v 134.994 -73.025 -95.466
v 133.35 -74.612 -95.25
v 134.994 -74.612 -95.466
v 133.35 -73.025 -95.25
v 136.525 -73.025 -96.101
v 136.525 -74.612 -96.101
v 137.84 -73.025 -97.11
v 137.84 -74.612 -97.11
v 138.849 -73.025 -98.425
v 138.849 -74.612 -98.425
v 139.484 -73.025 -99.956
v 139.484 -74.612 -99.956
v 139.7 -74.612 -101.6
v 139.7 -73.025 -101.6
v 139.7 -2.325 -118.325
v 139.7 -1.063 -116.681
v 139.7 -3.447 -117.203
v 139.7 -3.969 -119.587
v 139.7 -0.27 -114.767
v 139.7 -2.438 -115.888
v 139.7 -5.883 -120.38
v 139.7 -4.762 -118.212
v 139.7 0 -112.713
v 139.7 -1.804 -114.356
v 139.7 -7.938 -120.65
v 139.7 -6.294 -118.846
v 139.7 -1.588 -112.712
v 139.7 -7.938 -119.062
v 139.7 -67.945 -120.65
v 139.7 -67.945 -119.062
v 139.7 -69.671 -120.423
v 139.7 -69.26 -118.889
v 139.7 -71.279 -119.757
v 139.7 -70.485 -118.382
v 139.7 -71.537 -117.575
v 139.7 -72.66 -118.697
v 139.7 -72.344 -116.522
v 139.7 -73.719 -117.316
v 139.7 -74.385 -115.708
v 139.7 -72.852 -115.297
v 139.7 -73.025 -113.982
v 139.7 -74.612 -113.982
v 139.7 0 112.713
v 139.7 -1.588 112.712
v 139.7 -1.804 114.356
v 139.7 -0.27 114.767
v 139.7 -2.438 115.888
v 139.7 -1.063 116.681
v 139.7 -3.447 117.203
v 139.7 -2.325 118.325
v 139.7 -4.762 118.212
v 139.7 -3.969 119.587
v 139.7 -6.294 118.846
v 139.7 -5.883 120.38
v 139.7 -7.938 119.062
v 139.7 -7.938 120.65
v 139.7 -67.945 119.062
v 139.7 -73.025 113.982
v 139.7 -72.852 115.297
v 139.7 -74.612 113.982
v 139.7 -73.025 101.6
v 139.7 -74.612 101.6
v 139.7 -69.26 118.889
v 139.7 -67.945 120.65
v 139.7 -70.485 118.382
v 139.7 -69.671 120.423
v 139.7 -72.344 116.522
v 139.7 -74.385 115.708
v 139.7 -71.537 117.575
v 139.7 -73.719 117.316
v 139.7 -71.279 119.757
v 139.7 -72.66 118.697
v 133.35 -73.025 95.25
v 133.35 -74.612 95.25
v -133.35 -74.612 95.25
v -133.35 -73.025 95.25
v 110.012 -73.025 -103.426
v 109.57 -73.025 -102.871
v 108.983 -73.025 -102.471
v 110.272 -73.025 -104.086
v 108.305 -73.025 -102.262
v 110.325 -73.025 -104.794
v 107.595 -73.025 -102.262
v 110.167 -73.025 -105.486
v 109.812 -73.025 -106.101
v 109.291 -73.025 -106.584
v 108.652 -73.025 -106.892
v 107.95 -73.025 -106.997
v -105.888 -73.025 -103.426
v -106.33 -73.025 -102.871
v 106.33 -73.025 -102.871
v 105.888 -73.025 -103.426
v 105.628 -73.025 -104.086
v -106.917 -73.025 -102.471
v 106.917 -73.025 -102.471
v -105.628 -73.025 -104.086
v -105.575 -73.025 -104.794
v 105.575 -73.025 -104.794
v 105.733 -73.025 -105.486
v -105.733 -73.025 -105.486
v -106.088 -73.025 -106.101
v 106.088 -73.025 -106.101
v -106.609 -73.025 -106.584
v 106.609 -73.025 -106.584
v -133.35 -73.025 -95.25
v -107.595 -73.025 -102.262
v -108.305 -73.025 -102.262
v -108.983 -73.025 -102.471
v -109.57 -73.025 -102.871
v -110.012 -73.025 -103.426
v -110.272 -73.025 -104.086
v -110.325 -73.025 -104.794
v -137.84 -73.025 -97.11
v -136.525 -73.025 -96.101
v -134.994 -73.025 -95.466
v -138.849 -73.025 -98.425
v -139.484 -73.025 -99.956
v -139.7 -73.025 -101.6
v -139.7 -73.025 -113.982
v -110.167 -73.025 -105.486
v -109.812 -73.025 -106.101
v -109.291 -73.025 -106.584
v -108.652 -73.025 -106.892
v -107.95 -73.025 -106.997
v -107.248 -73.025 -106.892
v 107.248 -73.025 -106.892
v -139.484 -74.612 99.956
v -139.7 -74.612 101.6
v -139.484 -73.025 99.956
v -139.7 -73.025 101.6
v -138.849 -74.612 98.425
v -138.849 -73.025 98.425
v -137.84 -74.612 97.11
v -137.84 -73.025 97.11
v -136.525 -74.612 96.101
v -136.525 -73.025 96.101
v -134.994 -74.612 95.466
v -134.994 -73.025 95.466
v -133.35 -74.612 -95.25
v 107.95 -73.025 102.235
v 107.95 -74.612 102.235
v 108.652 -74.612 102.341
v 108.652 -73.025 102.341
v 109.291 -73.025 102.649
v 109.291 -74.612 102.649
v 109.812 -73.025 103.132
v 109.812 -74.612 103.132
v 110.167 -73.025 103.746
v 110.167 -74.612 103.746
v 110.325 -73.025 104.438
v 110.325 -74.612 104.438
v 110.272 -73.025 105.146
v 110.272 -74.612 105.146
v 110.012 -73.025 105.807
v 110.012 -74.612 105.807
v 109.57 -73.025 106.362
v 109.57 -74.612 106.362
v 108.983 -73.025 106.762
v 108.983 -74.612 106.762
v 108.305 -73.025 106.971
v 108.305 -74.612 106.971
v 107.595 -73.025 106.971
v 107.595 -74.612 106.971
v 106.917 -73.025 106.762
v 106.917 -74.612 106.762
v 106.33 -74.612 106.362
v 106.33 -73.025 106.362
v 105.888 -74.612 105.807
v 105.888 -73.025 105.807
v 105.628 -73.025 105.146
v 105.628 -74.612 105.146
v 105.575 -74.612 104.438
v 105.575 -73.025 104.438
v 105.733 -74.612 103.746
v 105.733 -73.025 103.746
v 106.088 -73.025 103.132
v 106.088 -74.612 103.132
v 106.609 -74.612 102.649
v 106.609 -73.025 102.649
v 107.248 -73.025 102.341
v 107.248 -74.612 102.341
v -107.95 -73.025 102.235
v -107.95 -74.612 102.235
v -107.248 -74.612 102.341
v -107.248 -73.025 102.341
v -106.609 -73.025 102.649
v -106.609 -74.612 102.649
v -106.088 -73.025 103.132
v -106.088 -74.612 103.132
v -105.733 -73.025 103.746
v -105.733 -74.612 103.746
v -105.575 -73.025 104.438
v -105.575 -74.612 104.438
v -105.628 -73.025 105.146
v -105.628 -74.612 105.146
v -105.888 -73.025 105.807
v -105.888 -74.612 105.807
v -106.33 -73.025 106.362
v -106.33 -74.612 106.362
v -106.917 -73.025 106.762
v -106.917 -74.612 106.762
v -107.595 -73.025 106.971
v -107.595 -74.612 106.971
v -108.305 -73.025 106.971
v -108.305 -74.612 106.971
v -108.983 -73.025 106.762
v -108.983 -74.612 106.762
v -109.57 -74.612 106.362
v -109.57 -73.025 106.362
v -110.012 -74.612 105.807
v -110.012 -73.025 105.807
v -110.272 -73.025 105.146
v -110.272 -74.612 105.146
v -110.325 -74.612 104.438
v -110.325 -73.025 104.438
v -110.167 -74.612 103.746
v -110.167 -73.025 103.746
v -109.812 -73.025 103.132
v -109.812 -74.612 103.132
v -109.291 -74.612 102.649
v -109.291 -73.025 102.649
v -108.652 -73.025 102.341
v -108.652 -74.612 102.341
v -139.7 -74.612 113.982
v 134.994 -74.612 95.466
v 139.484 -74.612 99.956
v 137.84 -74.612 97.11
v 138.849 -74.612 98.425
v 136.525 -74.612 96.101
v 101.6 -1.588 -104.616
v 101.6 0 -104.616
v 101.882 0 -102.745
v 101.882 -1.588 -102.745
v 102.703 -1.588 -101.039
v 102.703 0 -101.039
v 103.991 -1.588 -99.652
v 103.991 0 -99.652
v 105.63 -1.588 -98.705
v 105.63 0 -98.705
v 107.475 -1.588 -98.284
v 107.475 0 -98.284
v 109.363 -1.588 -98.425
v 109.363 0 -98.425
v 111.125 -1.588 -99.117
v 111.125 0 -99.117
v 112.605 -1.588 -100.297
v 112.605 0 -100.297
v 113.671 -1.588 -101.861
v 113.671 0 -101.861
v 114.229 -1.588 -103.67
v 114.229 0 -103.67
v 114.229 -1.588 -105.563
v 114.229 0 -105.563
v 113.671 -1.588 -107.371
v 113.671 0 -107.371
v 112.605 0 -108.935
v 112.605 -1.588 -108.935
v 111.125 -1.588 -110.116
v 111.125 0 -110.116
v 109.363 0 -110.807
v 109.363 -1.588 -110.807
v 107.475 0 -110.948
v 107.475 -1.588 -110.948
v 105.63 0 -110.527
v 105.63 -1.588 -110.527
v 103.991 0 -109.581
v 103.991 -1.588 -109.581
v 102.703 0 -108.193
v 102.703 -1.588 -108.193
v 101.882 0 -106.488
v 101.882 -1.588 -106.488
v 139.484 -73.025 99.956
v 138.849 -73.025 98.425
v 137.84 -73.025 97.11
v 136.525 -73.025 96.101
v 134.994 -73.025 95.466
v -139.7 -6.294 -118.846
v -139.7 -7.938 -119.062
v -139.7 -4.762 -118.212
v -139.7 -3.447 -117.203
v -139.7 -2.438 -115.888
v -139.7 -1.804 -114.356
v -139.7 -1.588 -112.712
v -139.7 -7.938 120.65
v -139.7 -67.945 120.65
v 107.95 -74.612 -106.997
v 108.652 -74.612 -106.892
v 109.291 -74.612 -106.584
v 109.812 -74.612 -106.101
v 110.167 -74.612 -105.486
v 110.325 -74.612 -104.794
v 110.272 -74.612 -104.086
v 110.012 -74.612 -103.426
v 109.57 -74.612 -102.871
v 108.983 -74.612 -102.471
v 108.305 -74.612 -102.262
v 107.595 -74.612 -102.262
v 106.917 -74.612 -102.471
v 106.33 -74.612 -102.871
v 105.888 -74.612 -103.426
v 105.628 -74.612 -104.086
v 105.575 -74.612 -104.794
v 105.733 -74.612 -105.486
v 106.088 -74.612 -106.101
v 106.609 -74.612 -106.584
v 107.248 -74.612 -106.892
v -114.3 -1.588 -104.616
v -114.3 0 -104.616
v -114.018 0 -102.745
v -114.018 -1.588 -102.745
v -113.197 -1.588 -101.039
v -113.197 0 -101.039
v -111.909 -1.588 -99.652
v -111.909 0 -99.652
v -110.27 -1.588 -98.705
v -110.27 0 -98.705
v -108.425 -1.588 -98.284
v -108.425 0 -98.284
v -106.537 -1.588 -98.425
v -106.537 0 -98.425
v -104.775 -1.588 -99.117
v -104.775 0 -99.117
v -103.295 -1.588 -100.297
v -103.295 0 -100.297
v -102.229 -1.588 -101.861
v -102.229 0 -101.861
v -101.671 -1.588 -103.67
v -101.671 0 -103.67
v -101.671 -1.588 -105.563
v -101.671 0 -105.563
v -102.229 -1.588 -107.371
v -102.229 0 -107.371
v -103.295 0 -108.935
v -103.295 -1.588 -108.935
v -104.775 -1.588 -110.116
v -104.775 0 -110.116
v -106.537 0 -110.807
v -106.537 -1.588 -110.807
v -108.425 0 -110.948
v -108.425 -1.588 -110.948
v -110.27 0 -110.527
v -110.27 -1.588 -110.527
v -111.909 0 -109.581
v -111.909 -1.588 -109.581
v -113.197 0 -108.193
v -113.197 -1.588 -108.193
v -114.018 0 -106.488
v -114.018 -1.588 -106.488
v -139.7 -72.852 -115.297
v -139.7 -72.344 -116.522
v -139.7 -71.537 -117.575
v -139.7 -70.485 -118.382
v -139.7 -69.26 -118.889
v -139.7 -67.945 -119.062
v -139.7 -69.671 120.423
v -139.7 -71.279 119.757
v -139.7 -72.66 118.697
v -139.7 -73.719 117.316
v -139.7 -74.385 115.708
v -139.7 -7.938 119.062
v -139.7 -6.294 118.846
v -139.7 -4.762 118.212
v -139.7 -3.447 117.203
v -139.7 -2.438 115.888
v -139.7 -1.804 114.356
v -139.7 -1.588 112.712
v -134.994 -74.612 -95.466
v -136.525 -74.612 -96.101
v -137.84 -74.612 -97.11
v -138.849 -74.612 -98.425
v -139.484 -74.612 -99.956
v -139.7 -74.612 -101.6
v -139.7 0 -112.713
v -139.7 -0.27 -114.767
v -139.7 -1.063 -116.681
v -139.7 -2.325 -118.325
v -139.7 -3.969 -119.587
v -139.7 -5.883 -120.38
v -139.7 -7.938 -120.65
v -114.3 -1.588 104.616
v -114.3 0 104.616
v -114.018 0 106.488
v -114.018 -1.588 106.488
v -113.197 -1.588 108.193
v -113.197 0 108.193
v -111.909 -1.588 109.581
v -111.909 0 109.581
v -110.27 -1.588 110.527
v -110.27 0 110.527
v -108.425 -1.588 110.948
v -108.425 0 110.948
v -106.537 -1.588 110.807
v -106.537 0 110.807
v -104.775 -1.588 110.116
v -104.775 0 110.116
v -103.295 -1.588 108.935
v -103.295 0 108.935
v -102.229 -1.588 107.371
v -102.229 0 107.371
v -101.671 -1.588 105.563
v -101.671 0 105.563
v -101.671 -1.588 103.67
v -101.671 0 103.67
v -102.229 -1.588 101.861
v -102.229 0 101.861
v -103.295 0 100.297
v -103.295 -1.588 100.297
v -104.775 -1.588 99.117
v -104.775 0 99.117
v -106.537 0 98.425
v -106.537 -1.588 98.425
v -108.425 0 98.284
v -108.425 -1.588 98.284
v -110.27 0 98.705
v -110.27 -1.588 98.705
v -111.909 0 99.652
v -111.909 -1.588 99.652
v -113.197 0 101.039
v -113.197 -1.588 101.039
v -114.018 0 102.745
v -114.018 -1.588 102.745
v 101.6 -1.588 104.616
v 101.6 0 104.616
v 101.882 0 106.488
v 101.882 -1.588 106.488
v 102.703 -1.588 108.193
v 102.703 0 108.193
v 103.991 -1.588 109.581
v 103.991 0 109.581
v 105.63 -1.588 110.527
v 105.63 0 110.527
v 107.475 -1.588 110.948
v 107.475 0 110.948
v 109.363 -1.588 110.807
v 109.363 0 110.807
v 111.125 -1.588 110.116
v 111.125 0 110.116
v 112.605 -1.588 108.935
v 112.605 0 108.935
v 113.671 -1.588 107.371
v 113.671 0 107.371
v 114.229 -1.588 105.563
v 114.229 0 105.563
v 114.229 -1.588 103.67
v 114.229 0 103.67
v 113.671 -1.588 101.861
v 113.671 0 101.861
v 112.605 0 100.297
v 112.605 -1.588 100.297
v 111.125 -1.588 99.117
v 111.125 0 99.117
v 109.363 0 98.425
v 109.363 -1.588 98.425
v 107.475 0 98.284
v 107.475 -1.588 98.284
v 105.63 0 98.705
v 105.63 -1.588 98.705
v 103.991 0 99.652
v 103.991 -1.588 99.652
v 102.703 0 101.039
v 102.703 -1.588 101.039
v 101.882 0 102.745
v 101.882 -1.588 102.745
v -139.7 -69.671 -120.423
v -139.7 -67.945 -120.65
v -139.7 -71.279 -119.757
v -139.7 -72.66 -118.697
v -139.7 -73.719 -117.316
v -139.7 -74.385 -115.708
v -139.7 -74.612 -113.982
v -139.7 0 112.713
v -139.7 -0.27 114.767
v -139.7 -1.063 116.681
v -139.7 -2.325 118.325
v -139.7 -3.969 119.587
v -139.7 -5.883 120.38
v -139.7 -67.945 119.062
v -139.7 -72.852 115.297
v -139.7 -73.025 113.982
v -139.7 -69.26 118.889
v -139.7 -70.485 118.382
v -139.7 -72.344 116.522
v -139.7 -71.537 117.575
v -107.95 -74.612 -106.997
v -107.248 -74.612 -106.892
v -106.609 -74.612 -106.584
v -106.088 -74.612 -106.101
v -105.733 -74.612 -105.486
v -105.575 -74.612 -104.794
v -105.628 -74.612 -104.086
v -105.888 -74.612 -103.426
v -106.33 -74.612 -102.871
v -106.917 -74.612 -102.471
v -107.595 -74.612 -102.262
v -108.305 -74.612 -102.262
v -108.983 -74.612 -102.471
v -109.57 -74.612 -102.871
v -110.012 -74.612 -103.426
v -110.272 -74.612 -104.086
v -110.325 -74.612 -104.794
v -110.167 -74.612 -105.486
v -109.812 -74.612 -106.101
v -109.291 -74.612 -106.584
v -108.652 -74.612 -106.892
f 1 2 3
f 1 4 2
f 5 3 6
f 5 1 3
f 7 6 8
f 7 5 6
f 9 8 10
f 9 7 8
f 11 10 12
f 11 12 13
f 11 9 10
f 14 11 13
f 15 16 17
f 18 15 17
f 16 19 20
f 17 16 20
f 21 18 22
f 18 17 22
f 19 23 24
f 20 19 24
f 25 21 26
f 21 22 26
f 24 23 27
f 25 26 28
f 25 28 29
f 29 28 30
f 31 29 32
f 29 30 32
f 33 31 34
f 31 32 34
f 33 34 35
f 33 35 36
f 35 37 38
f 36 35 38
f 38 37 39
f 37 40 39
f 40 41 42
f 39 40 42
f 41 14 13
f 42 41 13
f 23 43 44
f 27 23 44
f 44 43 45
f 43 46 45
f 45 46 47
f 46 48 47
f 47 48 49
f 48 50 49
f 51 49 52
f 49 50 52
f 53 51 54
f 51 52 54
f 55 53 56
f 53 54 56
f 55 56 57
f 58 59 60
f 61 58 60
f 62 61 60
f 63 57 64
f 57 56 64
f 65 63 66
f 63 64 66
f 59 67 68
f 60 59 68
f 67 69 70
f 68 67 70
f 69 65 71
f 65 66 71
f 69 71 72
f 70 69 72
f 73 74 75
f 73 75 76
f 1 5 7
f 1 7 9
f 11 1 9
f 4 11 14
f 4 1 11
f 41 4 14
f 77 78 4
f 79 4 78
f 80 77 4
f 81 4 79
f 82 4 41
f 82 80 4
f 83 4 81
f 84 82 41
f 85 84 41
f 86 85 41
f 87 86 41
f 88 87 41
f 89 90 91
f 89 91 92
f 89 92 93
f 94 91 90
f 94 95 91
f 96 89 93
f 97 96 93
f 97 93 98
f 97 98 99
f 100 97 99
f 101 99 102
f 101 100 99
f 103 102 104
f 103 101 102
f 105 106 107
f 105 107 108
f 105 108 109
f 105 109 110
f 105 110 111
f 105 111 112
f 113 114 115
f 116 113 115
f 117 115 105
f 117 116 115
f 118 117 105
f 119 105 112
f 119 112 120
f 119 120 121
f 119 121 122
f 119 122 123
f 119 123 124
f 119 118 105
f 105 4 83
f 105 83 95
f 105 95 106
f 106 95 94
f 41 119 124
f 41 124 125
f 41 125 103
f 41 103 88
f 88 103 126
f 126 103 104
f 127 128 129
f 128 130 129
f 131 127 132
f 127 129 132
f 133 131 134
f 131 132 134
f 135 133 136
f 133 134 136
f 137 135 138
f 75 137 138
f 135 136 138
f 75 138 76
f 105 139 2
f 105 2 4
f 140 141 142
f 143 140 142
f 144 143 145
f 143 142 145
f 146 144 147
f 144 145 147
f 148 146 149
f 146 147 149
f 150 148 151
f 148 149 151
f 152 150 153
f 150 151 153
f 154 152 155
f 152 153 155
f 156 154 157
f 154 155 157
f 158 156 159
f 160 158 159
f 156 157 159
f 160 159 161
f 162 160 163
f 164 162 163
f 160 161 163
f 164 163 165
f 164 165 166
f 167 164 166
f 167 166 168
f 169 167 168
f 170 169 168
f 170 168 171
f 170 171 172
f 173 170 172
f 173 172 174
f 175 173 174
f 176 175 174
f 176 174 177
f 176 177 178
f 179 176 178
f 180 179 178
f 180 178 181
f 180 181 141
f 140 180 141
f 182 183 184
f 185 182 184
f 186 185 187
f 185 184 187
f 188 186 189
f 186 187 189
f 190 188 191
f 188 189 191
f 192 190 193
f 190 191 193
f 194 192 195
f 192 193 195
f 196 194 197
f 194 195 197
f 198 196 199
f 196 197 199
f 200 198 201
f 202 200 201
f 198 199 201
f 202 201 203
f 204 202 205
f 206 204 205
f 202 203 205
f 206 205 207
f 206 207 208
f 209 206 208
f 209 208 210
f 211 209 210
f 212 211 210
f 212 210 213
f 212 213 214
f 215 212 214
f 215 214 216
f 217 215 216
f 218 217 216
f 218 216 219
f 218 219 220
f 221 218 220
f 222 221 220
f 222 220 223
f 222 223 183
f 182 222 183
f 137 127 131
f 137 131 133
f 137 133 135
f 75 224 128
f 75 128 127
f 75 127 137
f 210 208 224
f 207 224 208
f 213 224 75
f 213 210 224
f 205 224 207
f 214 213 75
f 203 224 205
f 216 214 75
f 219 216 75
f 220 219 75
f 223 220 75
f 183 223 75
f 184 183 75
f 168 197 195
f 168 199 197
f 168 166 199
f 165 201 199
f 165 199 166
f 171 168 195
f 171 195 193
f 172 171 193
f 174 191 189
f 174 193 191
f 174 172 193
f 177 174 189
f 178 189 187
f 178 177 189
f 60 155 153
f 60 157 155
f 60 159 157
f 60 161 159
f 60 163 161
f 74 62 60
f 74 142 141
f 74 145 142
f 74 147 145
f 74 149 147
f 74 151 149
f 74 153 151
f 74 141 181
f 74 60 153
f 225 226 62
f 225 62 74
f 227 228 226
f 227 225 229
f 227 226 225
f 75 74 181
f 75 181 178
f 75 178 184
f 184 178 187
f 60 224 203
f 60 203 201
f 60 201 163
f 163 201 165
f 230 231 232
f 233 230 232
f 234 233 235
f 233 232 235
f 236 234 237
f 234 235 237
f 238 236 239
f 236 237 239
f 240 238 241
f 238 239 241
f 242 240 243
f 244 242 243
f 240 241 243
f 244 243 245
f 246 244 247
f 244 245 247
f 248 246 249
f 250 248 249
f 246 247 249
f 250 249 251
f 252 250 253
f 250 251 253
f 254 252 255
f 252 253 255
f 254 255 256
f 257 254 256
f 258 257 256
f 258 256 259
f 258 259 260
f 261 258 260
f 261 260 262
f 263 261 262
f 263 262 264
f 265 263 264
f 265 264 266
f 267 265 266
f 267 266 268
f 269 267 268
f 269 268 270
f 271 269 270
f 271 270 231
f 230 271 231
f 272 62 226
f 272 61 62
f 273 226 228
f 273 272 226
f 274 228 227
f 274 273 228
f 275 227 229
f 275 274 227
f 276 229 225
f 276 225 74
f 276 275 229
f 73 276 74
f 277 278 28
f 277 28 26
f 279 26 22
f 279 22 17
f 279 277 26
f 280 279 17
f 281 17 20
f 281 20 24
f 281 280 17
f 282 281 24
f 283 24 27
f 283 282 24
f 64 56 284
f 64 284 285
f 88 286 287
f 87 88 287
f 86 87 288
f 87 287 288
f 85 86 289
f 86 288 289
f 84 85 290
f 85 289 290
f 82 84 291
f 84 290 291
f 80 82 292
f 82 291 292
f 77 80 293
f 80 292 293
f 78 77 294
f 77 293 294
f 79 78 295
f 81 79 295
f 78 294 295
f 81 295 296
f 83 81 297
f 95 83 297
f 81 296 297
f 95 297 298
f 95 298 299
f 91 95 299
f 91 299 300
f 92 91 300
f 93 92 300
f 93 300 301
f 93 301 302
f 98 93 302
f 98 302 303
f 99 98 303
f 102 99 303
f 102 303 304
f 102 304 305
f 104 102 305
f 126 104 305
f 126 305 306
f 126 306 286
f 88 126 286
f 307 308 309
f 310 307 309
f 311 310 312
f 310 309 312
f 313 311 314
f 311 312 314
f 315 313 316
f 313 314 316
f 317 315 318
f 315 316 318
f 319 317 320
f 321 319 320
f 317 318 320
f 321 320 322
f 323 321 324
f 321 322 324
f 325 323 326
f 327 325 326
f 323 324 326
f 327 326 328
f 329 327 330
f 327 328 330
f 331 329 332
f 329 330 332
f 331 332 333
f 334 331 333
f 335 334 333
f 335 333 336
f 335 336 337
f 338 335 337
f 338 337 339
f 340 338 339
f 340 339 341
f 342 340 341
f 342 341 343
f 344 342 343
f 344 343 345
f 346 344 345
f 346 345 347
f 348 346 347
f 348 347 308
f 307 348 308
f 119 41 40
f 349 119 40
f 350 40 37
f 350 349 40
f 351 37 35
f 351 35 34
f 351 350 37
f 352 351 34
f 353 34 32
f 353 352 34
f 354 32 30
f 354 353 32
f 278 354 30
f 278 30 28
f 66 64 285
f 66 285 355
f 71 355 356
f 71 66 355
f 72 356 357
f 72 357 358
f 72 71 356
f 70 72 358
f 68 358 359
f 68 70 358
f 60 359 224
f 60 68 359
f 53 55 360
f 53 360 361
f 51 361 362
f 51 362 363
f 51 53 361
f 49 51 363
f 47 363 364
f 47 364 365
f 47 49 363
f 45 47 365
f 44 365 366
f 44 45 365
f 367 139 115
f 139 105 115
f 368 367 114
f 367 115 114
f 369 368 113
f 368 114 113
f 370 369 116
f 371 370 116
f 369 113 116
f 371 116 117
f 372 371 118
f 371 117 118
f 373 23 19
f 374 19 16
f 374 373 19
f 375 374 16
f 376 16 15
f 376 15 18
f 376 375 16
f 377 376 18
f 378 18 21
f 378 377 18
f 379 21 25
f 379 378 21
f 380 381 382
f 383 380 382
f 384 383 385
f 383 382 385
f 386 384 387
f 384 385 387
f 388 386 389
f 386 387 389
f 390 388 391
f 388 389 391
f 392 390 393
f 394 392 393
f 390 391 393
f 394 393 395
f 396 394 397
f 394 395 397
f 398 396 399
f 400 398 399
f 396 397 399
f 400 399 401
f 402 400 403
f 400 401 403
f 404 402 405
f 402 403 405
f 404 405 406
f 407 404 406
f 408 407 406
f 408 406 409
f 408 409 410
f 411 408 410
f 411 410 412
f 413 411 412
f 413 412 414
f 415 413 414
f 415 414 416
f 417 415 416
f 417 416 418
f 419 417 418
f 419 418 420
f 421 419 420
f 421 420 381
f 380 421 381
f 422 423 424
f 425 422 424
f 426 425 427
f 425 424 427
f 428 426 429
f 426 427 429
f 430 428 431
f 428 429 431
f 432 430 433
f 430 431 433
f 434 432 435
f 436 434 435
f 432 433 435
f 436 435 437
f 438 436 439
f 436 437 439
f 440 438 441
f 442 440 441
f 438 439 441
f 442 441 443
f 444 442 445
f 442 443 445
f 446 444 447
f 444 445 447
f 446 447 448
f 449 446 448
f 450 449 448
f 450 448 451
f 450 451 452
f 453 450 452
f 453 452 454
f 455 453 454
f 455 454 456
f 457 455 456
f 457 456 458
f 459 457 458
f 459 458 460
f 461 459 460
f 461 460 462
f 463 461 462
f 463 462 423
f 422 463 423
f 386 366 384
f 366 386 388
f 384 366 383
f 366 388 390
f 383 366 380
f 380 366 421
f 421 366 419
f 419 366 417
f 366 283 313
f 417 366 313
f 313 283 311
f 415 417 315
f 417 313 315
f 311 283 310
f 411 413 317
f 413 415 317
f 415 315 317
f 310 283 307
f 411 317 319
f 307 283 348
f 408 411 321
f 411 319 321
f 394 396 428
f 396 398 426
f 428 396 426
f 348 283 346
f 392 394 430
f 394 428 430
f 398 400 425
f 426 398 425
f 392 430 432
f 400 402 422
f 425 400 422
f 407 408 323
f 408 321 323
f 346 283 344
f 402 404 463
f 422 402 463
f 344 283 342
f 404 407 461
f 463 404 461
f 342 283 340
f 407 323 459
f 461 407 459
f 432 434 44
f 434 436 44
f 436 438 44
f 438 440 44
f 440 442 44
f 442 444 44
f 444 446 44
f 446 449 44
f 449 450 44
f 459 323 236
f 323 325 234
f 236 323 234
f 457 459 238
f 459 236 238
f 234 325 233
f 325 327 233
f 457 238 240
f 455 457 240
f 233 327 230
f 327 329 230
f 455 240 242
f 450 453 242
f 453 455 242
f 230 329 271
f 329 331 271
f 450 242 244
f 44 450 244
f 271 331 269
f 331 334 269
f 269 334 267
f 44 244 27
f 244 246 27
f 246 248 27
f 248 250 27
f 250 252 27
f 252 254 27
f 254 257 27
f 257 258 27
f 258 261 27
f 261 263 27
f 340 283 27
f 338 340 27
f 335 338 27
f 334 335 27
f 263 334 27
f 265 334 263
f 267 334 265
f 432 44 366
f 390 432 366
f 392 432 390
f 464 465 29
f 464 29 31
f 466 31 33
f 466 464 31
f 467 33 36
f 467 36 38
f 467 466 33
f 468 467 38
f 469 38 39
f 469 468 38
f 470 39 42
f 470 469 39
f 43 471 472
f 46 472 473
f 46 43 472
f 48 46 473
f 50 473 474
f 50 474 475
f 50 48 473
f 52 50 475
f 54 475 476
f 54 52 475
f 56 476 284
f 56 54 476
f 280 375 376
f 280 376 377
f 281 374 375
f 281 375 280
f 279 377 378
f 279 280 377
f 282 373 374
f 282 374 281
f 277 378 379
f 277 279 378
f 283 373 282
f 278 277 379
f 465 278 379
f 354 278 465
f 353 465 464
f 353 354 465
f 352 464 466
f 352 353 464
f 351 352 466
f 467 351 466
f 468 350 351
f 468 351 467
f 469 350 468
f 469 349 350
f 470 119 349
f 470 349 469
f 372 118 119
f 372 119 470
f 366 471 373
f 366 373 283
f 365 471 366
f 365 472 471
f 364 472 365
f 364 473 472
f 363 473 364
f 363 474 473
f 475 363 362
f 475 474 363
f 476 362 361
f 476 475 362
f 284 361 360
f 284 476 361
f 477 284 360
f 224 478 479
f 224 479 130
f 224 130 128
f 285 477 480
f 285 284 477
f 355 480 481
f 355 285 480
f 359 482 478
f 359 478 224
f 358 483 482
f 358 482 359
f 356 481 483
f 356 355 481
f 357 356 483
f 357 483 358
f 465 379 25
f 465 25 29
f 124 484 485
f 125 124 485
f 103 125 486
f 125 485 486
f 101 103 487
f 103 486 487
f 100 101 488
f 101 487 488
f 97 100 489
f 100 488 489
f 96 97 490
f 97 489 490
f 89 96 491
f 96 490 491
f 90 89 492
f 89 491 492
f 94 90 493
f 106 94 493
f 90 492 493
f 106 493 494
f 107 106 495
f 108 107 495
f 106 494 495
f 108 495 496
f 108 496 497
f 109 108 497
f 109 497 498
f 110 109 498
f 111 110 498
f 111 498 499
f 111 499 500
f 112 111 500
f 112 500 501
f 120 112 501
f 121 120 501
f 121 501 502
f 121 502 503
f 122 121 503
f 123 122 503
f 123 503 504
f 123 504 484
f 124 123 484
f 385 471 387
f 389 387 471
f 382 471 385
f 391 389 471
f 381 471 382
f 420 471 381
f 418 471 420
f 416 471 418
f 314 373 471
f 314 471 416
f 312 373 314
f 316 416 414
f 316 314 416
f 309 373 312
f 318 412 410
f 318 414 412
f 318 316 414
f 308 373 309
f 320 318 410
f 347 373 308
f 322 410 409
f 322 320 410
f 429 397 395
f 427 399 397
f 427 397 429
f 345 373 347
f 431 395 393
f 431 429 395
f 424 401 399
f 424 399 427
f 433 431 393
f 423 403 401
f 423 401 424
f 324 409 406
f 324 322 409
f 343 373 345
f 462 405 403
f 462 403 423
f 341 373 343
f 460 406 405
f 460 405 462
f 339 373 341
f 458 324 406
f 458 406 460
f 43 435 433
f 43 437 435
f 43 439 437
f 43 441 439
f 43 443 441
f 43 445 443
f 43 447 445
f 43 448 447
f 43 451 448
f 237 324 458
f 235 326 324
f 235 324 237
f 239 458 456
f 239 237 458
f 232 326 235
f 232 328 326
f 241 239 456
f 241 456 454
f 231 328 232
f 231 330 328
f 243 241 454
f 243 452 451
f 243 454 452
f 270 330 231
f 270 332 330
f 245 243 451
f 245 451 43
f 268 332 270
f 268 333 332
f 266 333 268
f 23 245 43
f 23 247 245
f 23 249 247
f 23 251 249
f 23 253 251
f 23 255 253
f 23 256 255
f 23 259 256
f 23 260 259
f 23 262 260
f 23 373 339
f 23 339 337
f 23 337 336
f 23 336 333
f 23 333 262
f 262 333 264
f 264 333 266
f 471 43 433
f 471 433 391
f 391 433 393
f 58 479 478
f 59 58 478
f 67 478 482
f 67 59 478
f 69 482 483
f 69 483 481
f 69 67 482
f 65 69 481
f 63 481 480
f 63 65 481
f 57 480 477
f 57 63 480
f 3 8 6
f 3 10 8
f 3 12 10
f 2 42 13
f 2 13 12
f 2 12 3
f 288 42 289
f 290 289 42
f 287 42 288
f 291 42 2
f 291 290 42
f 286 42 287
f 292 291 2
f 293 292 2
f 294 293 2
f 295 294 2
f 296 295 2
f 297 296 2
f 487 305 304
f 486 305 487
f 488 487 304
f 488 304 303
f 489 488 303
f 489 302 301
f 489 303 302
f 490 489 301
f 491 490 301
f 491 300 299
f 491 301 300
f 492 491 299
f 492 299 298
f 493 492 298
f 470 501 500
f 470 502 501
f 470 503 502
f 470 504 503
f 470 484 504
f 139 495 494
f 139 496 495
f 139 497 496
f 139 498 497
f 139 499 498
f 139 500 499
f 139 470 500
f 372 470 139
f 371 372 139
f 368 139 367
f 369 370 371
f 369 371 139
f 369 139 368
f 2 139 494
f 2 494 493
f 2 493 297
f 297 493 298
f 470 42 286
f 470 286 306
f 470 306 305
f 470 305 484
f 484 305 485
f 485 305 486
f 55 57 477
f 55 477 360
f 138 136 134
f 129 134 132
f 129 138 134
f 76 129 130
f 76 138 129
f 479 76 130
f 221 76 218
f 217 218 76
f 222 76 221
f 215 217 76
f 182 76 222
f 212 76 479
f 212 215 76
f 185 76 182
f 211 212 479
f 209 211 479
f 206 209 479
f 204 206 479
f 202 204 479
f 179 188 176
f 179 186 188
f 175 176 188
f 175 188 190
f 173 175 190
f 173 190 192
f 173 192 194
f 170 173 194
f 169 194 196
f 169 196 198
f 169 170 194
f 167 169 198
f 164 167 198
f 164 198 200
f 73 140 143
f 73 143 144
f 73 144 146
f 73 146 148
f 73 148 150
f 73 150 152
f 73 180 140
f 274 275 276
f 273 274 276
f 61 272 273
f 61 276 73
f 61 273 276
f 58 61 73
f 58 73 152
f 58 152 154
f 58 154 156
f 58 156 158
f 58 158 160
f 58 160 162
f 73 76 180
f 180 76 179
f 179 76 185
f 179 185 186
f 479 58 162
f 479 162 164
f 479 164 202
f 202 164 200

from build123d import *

# Parameters (mm, degrees)
BASE_FLANGE1_DEPTH             = 120.65
BASE_FLANGE1_DEPTH_BACK        = 120.65
SKETCH2_W                      = 279.4
SKETCH2_H                      = 1.5875
EDGE_FLANGE1_STRIP_W           = 19.05
EDGE_FLANGE1_STRIP_H           = 1.5875
EDGE_FLANGE1_STRIP_CUT_DEPTH   = 279.4
EDGE_FLANGE1_STRIP_2_W         = 19.05
EDGE_FLANGE1_STRIP_2_H         = 1.5875
EDGE_FLANGE1_STRIP_CUT_2_DEPTH = 279.4
EDGE_FLANGE1_DEPTH             = 279.4
EDGE_FLANGE1_BEND_DEPTH        = 279.4
EDGE_FLANGE2_STRIP_W           = 16.51
EDGE_FLANGE2_STRIP_H           = 1.5875
EDGE_FLANGE2_STRIP_CUT_DEPTH   = 279.4
EDGE_FLANGE2_STRIP_2_W         = 16.51
EDGE_FLANGE2_STRIP_2_H         = 1.5875
EDGE_FLANGE2_STRIP_CUT_2_DEPTH = 279.4
EDGE_FLANGE2_DEPTH             = 279.4
EDGE_FLANGE2_BEND_DEPTH        = 279.4
FILLET1_R                      = 6.35
SKETCH18_R                     = 2.38125
CUT_EXTRUDE1_DEPTH             = 200.096804736
CUT_EXTRUDE2_REACH             = 201.097
SKETCH19_R                     = 6.35


# Sheet-metal steps are written as plain solids
with BuildPart() as part:
    # Sketch2 → Base-Flange1 (new, two sides: drawn at the far end of the back side and taken through both)
    with BuildSketch(Plane.XY.offset(-BASE_FLANGE1_DEPTH_BACK)):
        with Locations((0, -0.79375)):
            Rectangle(SKETCH2_W, SKETCH2_H)
    extrude(amount=BASE_FLANGE1_DEPTH + BASE_FLANGE1_DEPTH_BACK)

    # Edge-Flange1 strip (across the edge) → Edge-Flange1 strip cut (cut)
    with BuildSketch(Plane(origin=(139.7, -1.5875, 120.65), x_dir=(0, 0, -1), z_dir=(-1, 0, 0))):
        with Locations((-1.5875, -0.79375)):
            Rectangle(EDGE_FLANGE1_STRIP_W, EDGE_FLANGE1_STRIP_H)
    extrude(amount=EDGE_FLANGE1_STRIP_CUT_DEPTH, mode=Mode.SUBTRACT)

    # Edge-Flange1 strip 2 (across the edge) → Edge-Flange1 strip cut 2 (cut)
    with BuildSketch(Plane(origin=(-139.7, -1.5875, -120.65), x_dir=(0, 0, 1), z_dir=(1, 0, 0))):
        with Locations((-1.5875, -0.79375)):
            Rectangle(EDGE_FLANGE1_STRIP_2_W, EDGE_FLANGE1_STRIP_2_H)
    extrude(amount=EDGE_FLANGE1_STRIP_CUT_2_DEPTH, mode=Mode.SUBTRACT)

    # Edge-Flange1 section (across the edge) → Edge-Flange1 (add)
    with BuildSketch(Plane(origin=(139.7, -1.5875, 120.65), x_dir=(0, 0, -1), z_dir=(-1, 0, 0))):
        with BuildLine():
            Line((0, 6.35), (0, 73.025))
            Line((0, 73.025), (1.5875, 73.025))
            Line((1.5875, 73.025), (1.5875, 6.35))
            ThreePointArc((1.5875, 6.35), (3.447371939, 1.859871939), (7.9375, 0))
            Line((7.9375, 0), (7.9375, -1.5875))
            ThreePointArc((7.9375, -1.5875), (2.324839924, 0.737339924), (0, 6.35))
        make_face()
    extrude(amount=EDGE_FLANGE1_DEPTH)

    # Edge-Flange1 section 2 (across the edge) → Edge-Flange1 bend (add)
    with BuildSketch(Plane(origin=(-139.7, -1.5875, -120.65), x_dir=(0, 0, 1), z_dir=(1, 0, 0))):
        with BuildLine():
            Line((0, 6.35), (0, 73.025))
            Line((0, 73.025), (1.5875, 73.025))
            Line((1.5875, 73.025), (1.5875, 6.35))
            ThreePointArc((1.5875, 6.35), (3.447371939, 1.859871939), (7.9375, 0))
            Line((7.9375, 0), (7.9375, -1.5875))
            ThreePointArc((7.9375, -1.5875), (2.324839924, 0.737339924), (0, 6.35))
        make_face()
    extrude(amount=EDGE_FLANGE1_BEND_DEPTH)

    # Edge-Flange2 strip (across the edge) → Edge-Flange2 strip cut (cut)
    with BuildSketch(Plane(origin=(139.7, -74.6125, 119.0625), x_dir=(0, 1, 0), z_dir=(-1, 0, 0))):
        with Locations((-1.5875, -0.79375)):
            Rectangle(EDGE_FLANGE2_STRIP_W, EDGE_FLANGE2_STRIP_H)
    extrude(amount=EDGE_FLANGE2_STRIP_CUT_DEPTH, mode=Mode.SUBTRACT)

    # Edge-Flange2 strip 2 (across the edge) → Edge-Flange2 strip cut 2 (cut)
    with BuildSketch(Plane(origin=(-139.7, -74.6125, -119.0625), x_dir=(0, 1, 0), z_dir=(1, 0, 0))):
        with Locations((-1.5875, -0.79375)):
            Rectangle(EDGE_FLANGE2_STRIP_2_W, EDGE_FLANGE2_STRIP_2_H)
    extrude(amount=EDGE_FLANGE2_STRIP_CUT_2_DEPTH, mode=Mode.SUBTRACT)

    # Edge-Flange2 section (across the edge) → Edge-Flange2 (add)
    with BuildSketch(Plane(origin=(139.7, -74.6125, 119.0625), x_dir=(0, 1, 0), z_dir=(-1, 0, 0))):
        with BuildLine():
            Line((0, 5.08), (0, 23.8125))
            Line((0, 23.8125), (1.5875, 23.8125))
            Line((1.5875, 23.8125), (1.5875, 5.08))
            ThreePointArc((1.5875, 5.08), (3.075397552, 1.487897552), (6.6675, 0))
            Line((6.6675, 0), (6.6675, -1.5875))
            ThreePointArc((6.6675, -1.5875), (1.952865536, 0.365365536), (0, 5.08))
        make_face()
    extrude(amount=EDGE_FLANGE2_DEPTH)

    # Edge-Flange2 section 2 (across the edge) → Edge-Flange2 bend (add)
    with BuildSketch(Plane(origin=(-139.7, -74.6125, -119.0625), x_dir=(0, 1, 0), z_dir=(1, 0, 0))):
        with BuildLine():
            Line((0, 5.08), (0, 23.8125))
            Line((0, 23.8125), (1.5875, 23.8125))
            Line((1.5875, 23.8125), (1.5875, 5.08))
            ThreePointArc((1.5875, 5.08), (3.075397552, 1.487897552), (6.6675, 0))
            Line((6.6675, 0), (6.6675, -1.5875))
            ThreePointArc((6.6675, -1.5875), (1.952865536, 0.365365536), (0, 5.08))
        make_face()
    extrude(amount=EDGE_FLANGE2_BEND_DEPTH)

    # Fillet1
    fillet1_edges = [part.edges().sort_by_distance(p)[0] for p in [
        (139.7, -73.81875, 95.25),
        (-139.7, -73.81875, 95.25),
        (-139.7, -73.81875, -95.25),
        (139.7, -73.81875, -95.25),
    ]]
    fillet(fillet1_edges, radius=FILLET1_R)

    # Sketch18 → Cut-Extrude1 (cut, through all)
    with BuildSketch(Plane.XZ.offset(74.6125)):
        with Locations(Location((-107.95, 104.61625, 0), (0, 0, 270))):
            Circle(SKETCH18_R)
        with Locations(Location((-107.95, -104.61625, 0), (0, 0, 270))):
            Circle(SKETCH18_R)
        with Locations(Location((107.95, -104.61625, 0), (0, 0, 270))):
            Circle(SKETCH18_R)
        with Locations(Location((107.95, 104.61625, 0), (0, 0, 270))):
            Circle(SKETCH18_R)
    extrude(amount=-CUT_EXTRUDE1_DEPTH, mode=Mode.SUBTRACT)

    # Sketch19 → Cut-Extrude2 (cut, up to next)
    with BuildSketch(Plane(origin=(0, 0, 0), x_dir=(1, 0, 0), z_dir=(0, 1, 0)), mode=Mode.PRIVATE) as cut_extrude2_sk1:
        with Locations(Location((-107.95, -104.61625, 0), (0, 0, 180))):
            Circle(SKETCH19_R)
    cut_extrude2_tool1 = extrude(cut_extrude2_sk1.sketch, amount=-CUT_EXTRUDE2_REACH, mode=Mode.PRIVATE) & part.part
    # Sketch19 → Cut-Extrude2 (cut, up to next)
    with BuildSketch(Plane(origin=(0, 0, 0), x_dir=(1, 0, 0), z_dir=(0, 1, 0)), mode=Mode.PRIVATE) as cut_extrude2_sk2:
        with Locations(Location((107.95, -104.61625, 0), (0, 0, 180))):
            Circle(SKETCH19_R)
    cut_extrude2_tool2 = extrude(cut_extrude2_sk2.sketch, amount=-CUT_EXTRUDE2_REACH, mode=Mode.PRIVATE) & part.part
    # Sketch19 → Cut-Extrude2 (cut, up to next)
    with BuildSketch(Plane(origin=(0, 0, 0), x_dir=(1, 0, 0), z_dir=(0, 1, 0)), mode=Mode.PRIVATE) as cut_extrude2_sk3:
        with Locations(Location((107.95, 104.61625, 0), (0, 0, 180))):
            Circle(SKETCH19_R)
    cut_extrude2_tool3 = extrude(cut_extrude2_sk3.sketch, amount=-CUT_EXTRUDE2_REACH, mode=Mode.PRIVATE) & part.part
    # Sketch19 → Cut-Extrude2 (cut, up to next)
    with BuildSketch(Plane(origin=(0, 0, 0), x_dir=(1, 0, 0), z_dir=(0, 1, 0)), mode=Mode.PRIVATE) as cut_extrude2_sk4:
        with Locations(Location((-107.95, 104.61625, 0), (0, 0, 180))):
            Circle(SKETCH19_R)
    cut_extrude2_tool4 = extrude(cut_extrude2_sk4.sketch, amount=-CUT_EXTRUDE2_REACH, mode=Mode.PRIVATE) & part.part
    add(cut_extrude2_tool1.solids().sort_by_distance((-107.95, 0, 104.61625))[0], mode=Mode.SUBTRACT)
    add(cut_extrude2_tool2.solids().sort_by_distance((107.95, 0, 104.61625))[0], mode=Mode.SUBTRACT)
    add(cut_extrude2_tool3.solids().sort_by_distance((107.95, 0, -104.61625))[0], mode=Mode.SUBTRACT)
    add(cut_extrude2_tool4.solids().sort_by_distance((-107.95, 0, -104.61625))[0], mode=Mode.SUBTRACT)


solid = part.part
